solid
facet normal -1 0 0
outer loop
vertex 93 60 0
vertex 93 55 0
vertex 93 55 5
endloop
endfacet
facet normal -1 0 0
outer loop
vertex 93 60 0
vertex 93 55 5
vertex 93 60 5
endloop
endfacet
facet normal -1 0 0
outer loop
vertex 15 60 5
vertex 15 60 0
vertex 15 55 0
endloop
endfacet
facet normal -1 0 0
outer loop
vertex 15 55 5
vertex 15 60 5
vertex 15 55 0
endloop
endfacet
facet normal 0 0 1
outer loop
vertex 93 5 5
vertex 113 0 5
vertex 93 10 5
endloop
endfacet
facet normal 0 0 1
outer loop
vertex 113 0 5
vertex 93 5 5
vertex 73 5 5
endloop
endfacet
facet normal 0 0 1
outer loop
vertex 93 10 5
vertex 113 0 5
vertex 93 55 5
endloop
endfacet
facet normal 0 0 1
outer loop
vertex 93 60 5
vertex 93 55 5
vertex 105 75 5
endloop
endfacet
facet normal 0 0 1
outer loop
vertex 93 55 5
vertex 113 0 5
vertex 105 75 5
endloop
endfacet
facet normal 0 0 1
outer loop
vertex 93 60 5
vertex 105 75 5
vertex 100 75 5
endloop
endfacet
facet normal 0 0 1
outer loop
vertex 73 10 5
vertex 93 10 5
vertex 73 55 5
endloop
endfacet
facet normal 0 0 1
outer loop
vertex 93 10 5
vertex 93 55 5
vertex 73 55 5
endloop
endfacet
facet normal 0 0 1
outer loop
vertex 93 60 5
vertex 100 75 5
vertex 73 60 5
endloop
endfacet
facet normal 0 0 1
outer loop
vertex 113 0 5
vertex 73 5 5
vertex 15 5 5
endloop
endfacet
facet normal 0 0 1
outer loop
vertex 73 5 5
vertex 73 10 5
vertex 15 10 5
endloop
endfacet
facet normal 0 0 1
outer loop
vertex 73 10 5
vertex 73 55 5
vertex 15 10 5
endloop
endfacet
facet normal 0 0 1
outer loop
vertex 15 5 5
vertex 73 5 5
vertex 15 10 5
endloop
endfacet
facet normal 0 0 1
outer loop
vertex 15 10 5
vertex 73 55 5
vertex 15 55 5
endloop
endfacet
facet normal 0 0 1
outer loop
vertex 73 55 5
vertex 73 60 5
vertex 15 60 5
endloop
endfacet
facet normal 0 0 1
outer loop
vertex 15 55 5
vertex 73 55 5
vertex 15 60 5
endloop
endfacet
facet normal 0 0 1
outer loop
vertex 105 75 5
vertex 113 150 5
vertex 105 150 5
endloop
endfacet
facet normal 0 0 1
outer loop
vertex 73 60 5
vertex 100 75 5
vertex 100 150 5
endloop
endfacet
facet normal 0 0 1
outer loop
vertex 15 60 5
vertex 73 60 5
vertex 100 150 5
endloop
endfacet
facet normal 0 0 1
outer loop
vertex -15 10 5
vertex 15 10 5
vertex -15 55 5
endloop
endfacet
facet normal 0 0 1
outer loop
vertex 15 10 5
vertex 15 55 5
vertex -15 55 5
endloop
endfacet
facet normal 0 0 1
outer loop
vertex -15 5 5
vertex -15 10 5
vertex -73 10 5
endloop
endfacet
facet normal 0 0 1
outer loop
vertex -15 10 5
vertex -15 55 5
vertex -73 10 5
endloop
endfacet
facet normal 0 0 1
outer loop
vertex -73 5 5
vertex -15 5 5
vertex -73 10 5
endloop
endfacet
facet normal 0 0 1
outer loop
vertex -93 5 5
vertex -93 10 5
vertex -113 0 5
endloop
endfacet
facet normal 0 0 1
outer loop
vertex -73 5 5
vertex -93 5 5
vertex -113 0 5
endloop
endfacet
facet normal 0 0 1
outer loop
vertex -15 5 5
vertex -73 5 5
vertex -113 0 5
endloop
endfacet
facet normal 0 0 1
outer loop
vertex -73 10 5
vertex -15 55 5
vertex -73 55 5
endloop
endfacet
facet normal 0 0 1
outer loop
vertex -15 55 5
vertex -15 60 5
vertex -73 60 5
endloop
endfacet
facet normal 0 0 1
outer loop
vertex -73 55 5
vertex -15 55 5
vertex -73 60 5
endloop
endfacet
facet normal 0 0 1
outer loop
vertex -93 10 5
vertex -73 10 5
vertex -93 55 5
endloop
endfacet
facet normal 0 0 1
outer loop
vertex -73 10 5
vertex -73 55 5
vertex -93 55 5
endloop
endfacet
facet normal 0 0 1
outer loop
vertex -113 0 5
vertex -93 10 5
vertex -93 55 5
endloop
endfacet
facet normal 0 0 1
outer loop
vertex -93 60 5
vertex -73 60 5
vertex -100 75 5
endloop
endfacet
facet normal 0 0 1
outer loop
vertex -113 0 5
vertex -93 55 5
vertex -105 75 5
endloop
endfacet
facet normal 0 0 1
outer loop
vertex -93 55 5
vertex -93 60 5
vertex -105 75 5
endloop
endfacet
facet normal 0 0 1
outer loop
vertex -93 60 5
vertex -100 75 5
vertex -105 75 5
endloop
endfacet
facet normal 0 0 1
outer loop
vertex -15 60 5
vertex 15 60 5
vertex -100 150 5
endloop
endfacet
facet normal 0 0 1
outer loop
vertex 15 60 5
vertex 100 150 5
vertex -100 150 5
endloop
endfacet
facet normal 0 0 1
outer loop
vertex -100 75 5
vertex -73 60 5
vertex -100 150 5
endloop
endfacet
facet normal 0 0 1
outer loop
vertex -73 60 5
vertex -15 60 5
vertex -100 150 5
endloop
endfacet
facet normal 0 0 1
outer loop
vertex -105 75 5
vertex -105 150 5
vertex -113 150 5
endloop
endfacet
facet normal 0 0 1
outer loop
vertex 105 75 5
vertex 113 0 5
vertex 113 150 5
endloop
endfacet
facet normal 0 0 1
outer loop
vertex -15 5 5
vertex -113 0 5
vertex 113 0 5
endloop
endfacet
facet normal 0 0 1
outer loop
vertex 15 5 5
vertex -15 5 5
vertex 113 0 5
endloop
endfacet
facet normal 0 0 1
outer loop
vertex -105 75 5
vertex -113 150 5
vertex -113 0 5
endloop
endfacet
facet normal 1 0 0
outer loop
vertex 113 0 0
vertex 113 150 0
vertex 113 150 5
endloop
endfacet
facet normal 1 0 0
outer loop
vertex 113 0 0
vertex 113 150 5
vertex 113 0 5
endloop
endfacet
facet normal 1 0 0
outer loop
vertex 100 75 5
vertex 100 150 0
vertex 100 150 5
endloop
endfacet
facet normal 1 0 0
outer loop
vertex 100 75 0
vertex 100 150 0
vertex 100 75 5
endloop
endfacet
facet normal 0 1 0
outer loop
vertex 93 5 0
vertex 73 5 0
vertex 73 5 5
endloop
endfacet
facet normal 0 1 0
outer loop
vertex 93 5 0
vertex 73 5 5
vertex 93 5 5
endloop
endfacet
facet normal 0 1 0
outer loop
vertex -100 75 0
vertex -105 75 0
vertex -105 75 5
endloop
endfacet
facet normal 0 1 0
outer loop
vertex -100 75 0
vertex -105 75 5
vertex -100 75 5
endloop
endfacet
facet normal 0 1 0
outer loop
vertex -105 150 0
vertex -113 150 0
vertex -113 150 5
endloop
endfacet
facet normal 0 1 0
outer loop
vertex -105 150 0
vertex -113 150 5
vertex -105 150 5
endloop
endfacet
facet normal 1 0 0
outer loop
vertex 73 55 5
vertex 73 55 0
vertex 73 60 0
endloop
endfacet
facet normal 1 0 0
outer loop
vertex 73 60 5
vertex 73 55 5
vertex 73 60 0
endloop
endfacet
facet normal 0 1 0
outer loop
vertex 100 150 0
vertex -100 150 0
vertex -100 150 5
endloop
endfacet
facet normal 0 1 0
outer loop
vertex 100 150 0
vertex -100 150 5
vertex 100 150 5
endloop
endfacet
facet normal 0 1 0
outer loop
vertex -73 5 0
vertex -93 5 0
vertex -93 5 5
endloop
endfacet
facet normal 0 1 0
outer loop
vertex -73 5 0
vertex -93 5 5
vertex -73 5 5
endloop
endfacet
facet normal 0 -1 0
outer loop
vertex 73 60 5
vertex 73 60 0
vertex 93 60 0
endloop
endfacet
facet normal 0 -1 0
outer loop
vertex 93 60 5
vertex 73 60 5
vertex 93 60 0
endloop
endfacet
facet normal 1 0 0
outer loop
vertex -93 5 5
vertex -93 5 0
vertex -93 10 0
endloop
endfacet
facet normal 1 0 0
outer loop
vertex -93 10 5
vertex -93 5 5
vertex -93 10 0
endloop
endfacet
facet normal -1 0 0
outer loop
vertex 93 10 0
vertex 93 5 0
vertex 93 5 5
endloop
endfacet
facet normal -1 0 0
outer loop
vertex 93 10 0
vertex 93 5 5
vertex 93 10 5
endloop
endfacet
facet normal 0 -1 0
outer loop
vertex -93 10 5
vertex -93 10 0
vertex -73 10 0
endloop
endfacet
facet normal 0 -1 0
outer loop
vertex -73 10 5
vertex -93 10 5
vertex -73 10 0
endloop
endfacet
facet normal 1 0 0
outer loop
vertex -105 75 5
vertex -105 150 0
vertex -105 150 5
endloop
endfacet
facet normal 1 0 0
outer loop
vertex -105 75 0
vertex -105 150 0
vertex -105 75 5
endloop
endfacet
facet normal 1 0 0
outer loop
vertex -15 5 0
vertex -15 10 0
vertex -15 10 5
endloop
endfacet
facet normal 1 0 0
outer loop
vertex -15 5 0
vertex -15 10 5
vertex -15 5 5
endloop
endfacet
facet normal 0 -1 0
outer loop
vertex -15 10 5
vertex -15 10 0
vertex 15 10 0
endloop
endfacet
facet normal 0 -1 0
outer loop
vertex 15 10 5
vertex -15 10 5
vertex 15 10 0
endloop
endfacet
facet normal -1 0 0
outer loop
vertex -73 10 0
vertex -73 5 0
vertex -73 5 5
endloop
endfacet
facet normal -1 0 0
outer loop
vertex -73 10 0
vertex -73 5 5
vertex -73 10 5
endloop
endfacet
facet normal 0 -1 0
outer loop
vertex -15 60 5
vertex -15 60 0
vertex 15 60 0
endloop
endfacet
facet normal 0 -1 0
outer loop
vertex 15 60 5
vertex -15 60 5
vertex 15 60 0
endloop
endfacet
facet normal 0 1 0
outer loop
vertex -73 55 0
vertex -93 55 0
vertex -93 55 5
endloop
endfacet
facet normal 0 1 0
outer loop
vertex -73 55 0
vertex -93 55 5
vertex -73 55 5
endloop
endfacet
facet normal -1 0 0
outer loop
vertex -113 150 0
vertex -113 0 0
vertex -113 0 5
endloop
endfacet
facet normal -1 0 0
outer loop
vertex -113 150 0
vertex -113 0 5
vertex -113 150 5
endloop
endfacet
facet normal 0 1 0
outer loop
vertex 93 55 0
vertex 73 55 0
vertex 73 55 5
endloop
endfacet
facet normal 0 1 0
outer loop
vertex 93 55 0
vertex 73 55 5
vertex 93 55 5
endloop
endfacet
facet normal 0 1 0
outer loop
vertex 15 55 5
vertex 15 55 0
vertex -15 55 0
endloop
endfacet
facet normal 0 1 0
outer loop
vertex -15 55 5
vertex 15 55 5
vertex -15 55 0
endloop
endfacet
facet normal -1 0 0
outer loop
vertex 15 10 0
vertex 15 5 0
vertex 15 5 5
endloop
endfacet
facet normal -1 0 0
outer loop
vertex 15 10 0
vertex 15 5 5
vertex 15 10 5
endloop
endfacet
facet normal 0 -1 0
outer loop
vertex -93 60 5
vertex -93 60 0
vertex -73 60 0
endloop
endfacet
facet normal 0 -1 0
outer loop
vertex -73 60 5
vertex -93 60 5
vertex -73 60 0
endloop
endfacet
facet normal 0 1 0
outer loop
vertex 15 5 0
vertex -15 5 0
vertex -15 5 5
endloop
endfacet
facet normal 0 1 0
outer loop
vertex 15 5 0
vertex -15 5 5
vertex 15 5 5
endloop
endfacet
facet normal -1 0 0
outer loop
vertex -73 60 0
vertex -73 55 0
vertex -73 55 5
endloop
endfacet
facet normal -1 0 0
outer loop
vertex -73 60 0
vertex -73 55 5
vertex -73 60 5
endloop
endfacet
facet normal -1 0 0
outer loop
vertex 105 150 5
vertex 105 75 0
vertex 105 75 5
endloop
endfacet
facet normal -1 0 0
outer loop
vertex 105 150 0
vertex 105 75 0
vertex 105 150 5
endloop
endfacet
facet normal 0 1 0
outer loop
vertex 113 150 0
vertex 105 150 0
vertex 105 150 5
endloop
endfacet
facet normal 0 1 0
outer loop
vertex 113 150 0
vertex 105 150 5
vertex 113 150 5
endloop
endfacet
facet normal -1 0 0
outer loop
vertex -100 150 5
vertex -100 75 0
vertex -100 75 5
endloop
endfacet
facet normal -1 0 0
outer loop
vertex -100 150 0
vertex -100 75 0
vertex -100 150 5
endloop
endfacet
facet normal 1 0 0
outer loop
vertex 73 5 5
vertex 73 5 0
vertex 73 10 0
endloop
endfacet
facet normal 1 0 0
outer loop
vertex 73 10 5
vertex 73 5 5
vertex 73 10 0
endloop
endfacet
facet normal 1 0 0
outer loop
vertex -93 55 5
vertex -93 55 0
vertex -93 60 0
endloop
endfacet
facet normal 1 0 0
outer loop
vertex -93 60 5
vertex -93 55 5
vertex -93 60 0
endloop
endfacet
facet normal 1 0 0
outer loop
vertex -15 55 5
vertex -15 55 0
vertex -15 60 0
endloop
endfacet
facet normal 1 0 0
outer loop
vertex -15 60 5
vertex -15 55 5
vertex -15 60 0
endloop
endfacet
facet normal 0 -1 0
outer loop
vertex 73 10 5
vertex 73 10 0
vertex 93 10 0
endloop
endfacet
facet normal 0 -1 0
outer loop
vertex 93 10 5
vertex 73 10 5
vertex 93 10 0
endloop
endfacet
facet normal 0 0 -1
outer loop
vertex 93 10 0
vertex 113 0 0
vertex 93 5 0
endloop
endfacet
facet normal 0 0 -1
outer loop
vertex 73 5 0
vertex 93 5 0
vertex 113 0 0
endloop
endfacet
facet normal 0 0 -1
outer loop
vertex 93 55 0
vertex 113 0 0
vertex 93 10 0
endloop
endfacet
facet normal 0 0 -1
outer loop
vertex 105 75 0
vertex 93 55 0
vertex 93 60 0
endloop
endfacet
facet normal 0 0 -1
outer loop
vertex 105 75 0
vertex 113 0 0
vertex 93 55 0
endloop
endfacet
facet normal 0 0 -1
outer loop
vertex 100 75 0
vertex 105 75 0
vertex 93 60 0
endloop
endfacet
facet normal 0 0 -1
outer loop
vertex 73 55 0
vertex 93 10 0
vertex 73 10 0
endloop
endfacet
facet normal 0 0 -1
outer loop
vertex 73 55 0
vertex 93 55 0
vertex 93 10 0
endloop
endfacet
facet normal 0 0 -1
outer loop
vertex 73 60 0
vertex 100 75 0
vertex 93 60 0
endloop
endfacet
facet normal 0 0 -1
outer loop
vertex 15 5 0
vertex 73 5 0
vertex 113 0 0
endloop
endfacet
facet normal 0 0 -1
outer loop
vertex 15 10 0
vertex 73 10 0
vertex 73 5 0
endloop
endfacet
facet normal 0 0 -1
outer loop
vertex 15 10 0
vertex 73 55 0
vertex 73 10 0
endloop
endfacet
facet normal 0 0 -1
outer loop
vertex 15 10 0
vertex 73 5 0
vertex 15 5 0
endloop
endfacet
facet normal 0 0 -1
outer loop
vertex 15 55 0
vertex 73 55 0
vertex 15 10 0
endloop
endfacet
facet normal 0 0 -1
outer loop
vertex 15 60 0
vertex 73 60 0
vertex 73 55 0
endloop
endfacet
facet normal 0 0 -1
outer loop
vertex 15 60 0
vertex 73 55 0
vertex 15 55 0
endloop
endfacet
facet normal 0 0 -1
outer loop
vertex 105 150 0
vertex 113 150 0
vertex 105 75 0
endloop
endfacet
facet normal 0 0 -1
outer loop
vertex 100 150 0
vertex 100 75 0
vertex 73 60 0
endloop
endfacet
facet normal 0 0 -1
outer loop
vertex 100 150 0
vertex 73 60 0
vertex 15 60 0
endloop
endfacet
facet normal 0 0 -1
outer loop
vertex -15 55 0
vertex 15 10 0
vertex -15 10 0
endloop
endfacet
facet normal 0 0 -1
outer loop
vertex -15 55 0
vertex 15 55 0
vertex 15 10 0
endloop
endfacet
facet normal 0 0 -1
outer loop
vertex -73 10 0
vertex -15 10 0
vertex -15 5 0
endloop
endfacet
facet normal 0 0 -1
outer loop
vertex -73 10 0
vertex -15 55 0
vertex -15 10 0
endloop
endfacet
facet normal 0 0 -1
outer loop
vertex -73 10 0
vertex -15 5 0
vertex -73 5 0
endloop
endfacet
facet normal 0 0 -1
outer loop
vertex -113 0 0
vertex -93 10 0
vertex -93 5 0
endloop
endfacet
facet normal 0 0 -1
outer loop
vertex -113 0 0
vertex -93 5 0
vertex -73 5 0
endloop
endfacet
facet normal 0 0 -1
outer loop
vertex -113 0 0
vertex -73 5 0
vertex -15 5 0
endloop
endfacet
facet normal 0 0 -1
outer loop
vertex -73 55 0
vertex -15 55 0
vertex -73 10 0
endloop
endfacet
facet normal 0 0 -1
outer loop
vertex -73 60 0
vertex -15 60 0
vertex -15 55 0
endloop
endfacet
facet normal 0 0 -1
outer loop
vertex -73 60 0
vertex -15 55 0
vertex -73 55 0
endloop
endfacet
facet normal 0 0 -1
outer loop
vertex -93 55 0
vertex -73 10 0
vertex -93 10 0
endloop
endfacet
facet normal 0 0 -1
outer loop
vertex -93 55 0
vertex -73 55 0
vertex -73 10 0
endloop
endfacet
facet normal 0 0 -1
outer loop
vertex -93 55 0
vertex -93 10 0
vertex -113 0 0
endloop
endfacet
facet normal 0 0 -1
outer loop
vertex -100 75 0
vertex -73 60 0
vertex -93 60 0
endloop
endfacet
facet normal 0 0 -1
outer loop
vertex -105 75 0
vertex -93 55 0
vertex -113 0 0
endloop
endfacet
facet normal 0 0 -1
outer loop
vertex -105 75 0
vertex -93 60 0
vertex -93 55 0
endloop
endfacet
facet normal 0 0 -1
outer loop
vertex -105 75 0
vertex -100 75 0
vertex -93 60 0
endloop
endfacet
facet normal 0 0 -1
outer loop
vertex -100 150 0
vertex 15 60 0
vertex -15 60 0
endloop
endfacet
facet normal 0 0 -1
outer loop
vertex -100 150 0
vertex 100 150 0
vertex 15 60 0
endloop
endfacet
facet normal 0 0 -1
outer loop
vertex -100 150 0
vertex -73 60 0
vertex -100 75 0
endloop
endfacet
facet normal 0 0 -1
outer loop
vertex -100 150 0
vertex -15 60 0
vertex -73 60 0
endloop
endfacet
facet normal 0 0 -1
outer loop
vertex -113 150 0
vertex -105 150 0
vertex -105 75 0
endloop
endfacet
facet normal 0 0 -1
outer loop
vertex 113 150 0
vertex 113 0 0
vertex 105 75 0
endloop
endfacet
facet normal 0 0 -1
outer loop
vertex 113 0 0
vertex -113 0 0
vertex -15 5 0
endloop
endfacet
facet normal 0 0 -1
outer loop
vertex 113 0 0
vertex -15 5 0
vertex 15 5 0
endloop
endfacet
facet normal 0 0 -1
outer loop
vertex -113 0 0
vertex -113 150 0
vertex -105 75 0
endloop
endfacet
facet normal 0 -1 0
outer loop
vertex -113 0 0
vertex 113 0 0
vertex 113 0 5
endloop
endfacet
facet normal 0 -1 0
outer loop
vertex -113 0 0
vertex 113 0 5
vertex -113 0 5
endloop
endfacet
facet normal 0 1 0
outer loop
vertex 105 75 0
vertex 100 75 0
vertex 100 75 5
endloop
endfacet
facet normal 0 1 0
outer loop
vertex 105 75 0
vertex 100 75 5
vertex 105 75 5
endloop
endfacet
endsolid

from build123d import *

# Parameters (mm, degrees)
ESQUISSE1_W        = 20
ESQUISSE1_H        = 5
BOSS_EXTRU_1_DEPTH = 5


with BuildPart() as part:
    # Esquisse1 → Boss.-Extru.1 (new body)
    with BuildSketch(Plane.XY):
        Polygon((-100, 150), (100, 150), (100, 75), (105, 75), (105, 150), (113, 150), (113, 0), (-113, 0), (-113, 150), (-105, 150), (-105, 75), (-100, 75), align=None)
        with Locations((83, 7.5)):
            Rectangle(ESQUISSE1_W, ESQUISSE1_H, mode=Mode.SUBTRACT)
        with Locations((83, 57.5)):
            Rectangle(ESQUISSE1_W, ESQUISSE1_H, mode=Mode.SUBTRACT)
        Polygon((-15, 5), (15, 5), (15, 10), (0, 10), (-15, 10), align=None, mode=Mode.SUBTRACT)
        Polygon((-15, 60), (0, 60), (15, 60), (15, 55), (-15, 55), align=None, mode=Mode.SUBTRACT)
        with Locations((-83, 7.5)):
            Rectangle(ESQUISSE1_W, ESQUISSE1_H, mode=Mode.SUBTRACT)
        with Locations((-83, 57.5)):
            Rectangle(ESQUISSE1_W, ESQUISSE1_H, mode=Mode.SUBTRACT)
    extrude(amount=BOSS_EXTRU_1_DEPTH)


solid = part.part
